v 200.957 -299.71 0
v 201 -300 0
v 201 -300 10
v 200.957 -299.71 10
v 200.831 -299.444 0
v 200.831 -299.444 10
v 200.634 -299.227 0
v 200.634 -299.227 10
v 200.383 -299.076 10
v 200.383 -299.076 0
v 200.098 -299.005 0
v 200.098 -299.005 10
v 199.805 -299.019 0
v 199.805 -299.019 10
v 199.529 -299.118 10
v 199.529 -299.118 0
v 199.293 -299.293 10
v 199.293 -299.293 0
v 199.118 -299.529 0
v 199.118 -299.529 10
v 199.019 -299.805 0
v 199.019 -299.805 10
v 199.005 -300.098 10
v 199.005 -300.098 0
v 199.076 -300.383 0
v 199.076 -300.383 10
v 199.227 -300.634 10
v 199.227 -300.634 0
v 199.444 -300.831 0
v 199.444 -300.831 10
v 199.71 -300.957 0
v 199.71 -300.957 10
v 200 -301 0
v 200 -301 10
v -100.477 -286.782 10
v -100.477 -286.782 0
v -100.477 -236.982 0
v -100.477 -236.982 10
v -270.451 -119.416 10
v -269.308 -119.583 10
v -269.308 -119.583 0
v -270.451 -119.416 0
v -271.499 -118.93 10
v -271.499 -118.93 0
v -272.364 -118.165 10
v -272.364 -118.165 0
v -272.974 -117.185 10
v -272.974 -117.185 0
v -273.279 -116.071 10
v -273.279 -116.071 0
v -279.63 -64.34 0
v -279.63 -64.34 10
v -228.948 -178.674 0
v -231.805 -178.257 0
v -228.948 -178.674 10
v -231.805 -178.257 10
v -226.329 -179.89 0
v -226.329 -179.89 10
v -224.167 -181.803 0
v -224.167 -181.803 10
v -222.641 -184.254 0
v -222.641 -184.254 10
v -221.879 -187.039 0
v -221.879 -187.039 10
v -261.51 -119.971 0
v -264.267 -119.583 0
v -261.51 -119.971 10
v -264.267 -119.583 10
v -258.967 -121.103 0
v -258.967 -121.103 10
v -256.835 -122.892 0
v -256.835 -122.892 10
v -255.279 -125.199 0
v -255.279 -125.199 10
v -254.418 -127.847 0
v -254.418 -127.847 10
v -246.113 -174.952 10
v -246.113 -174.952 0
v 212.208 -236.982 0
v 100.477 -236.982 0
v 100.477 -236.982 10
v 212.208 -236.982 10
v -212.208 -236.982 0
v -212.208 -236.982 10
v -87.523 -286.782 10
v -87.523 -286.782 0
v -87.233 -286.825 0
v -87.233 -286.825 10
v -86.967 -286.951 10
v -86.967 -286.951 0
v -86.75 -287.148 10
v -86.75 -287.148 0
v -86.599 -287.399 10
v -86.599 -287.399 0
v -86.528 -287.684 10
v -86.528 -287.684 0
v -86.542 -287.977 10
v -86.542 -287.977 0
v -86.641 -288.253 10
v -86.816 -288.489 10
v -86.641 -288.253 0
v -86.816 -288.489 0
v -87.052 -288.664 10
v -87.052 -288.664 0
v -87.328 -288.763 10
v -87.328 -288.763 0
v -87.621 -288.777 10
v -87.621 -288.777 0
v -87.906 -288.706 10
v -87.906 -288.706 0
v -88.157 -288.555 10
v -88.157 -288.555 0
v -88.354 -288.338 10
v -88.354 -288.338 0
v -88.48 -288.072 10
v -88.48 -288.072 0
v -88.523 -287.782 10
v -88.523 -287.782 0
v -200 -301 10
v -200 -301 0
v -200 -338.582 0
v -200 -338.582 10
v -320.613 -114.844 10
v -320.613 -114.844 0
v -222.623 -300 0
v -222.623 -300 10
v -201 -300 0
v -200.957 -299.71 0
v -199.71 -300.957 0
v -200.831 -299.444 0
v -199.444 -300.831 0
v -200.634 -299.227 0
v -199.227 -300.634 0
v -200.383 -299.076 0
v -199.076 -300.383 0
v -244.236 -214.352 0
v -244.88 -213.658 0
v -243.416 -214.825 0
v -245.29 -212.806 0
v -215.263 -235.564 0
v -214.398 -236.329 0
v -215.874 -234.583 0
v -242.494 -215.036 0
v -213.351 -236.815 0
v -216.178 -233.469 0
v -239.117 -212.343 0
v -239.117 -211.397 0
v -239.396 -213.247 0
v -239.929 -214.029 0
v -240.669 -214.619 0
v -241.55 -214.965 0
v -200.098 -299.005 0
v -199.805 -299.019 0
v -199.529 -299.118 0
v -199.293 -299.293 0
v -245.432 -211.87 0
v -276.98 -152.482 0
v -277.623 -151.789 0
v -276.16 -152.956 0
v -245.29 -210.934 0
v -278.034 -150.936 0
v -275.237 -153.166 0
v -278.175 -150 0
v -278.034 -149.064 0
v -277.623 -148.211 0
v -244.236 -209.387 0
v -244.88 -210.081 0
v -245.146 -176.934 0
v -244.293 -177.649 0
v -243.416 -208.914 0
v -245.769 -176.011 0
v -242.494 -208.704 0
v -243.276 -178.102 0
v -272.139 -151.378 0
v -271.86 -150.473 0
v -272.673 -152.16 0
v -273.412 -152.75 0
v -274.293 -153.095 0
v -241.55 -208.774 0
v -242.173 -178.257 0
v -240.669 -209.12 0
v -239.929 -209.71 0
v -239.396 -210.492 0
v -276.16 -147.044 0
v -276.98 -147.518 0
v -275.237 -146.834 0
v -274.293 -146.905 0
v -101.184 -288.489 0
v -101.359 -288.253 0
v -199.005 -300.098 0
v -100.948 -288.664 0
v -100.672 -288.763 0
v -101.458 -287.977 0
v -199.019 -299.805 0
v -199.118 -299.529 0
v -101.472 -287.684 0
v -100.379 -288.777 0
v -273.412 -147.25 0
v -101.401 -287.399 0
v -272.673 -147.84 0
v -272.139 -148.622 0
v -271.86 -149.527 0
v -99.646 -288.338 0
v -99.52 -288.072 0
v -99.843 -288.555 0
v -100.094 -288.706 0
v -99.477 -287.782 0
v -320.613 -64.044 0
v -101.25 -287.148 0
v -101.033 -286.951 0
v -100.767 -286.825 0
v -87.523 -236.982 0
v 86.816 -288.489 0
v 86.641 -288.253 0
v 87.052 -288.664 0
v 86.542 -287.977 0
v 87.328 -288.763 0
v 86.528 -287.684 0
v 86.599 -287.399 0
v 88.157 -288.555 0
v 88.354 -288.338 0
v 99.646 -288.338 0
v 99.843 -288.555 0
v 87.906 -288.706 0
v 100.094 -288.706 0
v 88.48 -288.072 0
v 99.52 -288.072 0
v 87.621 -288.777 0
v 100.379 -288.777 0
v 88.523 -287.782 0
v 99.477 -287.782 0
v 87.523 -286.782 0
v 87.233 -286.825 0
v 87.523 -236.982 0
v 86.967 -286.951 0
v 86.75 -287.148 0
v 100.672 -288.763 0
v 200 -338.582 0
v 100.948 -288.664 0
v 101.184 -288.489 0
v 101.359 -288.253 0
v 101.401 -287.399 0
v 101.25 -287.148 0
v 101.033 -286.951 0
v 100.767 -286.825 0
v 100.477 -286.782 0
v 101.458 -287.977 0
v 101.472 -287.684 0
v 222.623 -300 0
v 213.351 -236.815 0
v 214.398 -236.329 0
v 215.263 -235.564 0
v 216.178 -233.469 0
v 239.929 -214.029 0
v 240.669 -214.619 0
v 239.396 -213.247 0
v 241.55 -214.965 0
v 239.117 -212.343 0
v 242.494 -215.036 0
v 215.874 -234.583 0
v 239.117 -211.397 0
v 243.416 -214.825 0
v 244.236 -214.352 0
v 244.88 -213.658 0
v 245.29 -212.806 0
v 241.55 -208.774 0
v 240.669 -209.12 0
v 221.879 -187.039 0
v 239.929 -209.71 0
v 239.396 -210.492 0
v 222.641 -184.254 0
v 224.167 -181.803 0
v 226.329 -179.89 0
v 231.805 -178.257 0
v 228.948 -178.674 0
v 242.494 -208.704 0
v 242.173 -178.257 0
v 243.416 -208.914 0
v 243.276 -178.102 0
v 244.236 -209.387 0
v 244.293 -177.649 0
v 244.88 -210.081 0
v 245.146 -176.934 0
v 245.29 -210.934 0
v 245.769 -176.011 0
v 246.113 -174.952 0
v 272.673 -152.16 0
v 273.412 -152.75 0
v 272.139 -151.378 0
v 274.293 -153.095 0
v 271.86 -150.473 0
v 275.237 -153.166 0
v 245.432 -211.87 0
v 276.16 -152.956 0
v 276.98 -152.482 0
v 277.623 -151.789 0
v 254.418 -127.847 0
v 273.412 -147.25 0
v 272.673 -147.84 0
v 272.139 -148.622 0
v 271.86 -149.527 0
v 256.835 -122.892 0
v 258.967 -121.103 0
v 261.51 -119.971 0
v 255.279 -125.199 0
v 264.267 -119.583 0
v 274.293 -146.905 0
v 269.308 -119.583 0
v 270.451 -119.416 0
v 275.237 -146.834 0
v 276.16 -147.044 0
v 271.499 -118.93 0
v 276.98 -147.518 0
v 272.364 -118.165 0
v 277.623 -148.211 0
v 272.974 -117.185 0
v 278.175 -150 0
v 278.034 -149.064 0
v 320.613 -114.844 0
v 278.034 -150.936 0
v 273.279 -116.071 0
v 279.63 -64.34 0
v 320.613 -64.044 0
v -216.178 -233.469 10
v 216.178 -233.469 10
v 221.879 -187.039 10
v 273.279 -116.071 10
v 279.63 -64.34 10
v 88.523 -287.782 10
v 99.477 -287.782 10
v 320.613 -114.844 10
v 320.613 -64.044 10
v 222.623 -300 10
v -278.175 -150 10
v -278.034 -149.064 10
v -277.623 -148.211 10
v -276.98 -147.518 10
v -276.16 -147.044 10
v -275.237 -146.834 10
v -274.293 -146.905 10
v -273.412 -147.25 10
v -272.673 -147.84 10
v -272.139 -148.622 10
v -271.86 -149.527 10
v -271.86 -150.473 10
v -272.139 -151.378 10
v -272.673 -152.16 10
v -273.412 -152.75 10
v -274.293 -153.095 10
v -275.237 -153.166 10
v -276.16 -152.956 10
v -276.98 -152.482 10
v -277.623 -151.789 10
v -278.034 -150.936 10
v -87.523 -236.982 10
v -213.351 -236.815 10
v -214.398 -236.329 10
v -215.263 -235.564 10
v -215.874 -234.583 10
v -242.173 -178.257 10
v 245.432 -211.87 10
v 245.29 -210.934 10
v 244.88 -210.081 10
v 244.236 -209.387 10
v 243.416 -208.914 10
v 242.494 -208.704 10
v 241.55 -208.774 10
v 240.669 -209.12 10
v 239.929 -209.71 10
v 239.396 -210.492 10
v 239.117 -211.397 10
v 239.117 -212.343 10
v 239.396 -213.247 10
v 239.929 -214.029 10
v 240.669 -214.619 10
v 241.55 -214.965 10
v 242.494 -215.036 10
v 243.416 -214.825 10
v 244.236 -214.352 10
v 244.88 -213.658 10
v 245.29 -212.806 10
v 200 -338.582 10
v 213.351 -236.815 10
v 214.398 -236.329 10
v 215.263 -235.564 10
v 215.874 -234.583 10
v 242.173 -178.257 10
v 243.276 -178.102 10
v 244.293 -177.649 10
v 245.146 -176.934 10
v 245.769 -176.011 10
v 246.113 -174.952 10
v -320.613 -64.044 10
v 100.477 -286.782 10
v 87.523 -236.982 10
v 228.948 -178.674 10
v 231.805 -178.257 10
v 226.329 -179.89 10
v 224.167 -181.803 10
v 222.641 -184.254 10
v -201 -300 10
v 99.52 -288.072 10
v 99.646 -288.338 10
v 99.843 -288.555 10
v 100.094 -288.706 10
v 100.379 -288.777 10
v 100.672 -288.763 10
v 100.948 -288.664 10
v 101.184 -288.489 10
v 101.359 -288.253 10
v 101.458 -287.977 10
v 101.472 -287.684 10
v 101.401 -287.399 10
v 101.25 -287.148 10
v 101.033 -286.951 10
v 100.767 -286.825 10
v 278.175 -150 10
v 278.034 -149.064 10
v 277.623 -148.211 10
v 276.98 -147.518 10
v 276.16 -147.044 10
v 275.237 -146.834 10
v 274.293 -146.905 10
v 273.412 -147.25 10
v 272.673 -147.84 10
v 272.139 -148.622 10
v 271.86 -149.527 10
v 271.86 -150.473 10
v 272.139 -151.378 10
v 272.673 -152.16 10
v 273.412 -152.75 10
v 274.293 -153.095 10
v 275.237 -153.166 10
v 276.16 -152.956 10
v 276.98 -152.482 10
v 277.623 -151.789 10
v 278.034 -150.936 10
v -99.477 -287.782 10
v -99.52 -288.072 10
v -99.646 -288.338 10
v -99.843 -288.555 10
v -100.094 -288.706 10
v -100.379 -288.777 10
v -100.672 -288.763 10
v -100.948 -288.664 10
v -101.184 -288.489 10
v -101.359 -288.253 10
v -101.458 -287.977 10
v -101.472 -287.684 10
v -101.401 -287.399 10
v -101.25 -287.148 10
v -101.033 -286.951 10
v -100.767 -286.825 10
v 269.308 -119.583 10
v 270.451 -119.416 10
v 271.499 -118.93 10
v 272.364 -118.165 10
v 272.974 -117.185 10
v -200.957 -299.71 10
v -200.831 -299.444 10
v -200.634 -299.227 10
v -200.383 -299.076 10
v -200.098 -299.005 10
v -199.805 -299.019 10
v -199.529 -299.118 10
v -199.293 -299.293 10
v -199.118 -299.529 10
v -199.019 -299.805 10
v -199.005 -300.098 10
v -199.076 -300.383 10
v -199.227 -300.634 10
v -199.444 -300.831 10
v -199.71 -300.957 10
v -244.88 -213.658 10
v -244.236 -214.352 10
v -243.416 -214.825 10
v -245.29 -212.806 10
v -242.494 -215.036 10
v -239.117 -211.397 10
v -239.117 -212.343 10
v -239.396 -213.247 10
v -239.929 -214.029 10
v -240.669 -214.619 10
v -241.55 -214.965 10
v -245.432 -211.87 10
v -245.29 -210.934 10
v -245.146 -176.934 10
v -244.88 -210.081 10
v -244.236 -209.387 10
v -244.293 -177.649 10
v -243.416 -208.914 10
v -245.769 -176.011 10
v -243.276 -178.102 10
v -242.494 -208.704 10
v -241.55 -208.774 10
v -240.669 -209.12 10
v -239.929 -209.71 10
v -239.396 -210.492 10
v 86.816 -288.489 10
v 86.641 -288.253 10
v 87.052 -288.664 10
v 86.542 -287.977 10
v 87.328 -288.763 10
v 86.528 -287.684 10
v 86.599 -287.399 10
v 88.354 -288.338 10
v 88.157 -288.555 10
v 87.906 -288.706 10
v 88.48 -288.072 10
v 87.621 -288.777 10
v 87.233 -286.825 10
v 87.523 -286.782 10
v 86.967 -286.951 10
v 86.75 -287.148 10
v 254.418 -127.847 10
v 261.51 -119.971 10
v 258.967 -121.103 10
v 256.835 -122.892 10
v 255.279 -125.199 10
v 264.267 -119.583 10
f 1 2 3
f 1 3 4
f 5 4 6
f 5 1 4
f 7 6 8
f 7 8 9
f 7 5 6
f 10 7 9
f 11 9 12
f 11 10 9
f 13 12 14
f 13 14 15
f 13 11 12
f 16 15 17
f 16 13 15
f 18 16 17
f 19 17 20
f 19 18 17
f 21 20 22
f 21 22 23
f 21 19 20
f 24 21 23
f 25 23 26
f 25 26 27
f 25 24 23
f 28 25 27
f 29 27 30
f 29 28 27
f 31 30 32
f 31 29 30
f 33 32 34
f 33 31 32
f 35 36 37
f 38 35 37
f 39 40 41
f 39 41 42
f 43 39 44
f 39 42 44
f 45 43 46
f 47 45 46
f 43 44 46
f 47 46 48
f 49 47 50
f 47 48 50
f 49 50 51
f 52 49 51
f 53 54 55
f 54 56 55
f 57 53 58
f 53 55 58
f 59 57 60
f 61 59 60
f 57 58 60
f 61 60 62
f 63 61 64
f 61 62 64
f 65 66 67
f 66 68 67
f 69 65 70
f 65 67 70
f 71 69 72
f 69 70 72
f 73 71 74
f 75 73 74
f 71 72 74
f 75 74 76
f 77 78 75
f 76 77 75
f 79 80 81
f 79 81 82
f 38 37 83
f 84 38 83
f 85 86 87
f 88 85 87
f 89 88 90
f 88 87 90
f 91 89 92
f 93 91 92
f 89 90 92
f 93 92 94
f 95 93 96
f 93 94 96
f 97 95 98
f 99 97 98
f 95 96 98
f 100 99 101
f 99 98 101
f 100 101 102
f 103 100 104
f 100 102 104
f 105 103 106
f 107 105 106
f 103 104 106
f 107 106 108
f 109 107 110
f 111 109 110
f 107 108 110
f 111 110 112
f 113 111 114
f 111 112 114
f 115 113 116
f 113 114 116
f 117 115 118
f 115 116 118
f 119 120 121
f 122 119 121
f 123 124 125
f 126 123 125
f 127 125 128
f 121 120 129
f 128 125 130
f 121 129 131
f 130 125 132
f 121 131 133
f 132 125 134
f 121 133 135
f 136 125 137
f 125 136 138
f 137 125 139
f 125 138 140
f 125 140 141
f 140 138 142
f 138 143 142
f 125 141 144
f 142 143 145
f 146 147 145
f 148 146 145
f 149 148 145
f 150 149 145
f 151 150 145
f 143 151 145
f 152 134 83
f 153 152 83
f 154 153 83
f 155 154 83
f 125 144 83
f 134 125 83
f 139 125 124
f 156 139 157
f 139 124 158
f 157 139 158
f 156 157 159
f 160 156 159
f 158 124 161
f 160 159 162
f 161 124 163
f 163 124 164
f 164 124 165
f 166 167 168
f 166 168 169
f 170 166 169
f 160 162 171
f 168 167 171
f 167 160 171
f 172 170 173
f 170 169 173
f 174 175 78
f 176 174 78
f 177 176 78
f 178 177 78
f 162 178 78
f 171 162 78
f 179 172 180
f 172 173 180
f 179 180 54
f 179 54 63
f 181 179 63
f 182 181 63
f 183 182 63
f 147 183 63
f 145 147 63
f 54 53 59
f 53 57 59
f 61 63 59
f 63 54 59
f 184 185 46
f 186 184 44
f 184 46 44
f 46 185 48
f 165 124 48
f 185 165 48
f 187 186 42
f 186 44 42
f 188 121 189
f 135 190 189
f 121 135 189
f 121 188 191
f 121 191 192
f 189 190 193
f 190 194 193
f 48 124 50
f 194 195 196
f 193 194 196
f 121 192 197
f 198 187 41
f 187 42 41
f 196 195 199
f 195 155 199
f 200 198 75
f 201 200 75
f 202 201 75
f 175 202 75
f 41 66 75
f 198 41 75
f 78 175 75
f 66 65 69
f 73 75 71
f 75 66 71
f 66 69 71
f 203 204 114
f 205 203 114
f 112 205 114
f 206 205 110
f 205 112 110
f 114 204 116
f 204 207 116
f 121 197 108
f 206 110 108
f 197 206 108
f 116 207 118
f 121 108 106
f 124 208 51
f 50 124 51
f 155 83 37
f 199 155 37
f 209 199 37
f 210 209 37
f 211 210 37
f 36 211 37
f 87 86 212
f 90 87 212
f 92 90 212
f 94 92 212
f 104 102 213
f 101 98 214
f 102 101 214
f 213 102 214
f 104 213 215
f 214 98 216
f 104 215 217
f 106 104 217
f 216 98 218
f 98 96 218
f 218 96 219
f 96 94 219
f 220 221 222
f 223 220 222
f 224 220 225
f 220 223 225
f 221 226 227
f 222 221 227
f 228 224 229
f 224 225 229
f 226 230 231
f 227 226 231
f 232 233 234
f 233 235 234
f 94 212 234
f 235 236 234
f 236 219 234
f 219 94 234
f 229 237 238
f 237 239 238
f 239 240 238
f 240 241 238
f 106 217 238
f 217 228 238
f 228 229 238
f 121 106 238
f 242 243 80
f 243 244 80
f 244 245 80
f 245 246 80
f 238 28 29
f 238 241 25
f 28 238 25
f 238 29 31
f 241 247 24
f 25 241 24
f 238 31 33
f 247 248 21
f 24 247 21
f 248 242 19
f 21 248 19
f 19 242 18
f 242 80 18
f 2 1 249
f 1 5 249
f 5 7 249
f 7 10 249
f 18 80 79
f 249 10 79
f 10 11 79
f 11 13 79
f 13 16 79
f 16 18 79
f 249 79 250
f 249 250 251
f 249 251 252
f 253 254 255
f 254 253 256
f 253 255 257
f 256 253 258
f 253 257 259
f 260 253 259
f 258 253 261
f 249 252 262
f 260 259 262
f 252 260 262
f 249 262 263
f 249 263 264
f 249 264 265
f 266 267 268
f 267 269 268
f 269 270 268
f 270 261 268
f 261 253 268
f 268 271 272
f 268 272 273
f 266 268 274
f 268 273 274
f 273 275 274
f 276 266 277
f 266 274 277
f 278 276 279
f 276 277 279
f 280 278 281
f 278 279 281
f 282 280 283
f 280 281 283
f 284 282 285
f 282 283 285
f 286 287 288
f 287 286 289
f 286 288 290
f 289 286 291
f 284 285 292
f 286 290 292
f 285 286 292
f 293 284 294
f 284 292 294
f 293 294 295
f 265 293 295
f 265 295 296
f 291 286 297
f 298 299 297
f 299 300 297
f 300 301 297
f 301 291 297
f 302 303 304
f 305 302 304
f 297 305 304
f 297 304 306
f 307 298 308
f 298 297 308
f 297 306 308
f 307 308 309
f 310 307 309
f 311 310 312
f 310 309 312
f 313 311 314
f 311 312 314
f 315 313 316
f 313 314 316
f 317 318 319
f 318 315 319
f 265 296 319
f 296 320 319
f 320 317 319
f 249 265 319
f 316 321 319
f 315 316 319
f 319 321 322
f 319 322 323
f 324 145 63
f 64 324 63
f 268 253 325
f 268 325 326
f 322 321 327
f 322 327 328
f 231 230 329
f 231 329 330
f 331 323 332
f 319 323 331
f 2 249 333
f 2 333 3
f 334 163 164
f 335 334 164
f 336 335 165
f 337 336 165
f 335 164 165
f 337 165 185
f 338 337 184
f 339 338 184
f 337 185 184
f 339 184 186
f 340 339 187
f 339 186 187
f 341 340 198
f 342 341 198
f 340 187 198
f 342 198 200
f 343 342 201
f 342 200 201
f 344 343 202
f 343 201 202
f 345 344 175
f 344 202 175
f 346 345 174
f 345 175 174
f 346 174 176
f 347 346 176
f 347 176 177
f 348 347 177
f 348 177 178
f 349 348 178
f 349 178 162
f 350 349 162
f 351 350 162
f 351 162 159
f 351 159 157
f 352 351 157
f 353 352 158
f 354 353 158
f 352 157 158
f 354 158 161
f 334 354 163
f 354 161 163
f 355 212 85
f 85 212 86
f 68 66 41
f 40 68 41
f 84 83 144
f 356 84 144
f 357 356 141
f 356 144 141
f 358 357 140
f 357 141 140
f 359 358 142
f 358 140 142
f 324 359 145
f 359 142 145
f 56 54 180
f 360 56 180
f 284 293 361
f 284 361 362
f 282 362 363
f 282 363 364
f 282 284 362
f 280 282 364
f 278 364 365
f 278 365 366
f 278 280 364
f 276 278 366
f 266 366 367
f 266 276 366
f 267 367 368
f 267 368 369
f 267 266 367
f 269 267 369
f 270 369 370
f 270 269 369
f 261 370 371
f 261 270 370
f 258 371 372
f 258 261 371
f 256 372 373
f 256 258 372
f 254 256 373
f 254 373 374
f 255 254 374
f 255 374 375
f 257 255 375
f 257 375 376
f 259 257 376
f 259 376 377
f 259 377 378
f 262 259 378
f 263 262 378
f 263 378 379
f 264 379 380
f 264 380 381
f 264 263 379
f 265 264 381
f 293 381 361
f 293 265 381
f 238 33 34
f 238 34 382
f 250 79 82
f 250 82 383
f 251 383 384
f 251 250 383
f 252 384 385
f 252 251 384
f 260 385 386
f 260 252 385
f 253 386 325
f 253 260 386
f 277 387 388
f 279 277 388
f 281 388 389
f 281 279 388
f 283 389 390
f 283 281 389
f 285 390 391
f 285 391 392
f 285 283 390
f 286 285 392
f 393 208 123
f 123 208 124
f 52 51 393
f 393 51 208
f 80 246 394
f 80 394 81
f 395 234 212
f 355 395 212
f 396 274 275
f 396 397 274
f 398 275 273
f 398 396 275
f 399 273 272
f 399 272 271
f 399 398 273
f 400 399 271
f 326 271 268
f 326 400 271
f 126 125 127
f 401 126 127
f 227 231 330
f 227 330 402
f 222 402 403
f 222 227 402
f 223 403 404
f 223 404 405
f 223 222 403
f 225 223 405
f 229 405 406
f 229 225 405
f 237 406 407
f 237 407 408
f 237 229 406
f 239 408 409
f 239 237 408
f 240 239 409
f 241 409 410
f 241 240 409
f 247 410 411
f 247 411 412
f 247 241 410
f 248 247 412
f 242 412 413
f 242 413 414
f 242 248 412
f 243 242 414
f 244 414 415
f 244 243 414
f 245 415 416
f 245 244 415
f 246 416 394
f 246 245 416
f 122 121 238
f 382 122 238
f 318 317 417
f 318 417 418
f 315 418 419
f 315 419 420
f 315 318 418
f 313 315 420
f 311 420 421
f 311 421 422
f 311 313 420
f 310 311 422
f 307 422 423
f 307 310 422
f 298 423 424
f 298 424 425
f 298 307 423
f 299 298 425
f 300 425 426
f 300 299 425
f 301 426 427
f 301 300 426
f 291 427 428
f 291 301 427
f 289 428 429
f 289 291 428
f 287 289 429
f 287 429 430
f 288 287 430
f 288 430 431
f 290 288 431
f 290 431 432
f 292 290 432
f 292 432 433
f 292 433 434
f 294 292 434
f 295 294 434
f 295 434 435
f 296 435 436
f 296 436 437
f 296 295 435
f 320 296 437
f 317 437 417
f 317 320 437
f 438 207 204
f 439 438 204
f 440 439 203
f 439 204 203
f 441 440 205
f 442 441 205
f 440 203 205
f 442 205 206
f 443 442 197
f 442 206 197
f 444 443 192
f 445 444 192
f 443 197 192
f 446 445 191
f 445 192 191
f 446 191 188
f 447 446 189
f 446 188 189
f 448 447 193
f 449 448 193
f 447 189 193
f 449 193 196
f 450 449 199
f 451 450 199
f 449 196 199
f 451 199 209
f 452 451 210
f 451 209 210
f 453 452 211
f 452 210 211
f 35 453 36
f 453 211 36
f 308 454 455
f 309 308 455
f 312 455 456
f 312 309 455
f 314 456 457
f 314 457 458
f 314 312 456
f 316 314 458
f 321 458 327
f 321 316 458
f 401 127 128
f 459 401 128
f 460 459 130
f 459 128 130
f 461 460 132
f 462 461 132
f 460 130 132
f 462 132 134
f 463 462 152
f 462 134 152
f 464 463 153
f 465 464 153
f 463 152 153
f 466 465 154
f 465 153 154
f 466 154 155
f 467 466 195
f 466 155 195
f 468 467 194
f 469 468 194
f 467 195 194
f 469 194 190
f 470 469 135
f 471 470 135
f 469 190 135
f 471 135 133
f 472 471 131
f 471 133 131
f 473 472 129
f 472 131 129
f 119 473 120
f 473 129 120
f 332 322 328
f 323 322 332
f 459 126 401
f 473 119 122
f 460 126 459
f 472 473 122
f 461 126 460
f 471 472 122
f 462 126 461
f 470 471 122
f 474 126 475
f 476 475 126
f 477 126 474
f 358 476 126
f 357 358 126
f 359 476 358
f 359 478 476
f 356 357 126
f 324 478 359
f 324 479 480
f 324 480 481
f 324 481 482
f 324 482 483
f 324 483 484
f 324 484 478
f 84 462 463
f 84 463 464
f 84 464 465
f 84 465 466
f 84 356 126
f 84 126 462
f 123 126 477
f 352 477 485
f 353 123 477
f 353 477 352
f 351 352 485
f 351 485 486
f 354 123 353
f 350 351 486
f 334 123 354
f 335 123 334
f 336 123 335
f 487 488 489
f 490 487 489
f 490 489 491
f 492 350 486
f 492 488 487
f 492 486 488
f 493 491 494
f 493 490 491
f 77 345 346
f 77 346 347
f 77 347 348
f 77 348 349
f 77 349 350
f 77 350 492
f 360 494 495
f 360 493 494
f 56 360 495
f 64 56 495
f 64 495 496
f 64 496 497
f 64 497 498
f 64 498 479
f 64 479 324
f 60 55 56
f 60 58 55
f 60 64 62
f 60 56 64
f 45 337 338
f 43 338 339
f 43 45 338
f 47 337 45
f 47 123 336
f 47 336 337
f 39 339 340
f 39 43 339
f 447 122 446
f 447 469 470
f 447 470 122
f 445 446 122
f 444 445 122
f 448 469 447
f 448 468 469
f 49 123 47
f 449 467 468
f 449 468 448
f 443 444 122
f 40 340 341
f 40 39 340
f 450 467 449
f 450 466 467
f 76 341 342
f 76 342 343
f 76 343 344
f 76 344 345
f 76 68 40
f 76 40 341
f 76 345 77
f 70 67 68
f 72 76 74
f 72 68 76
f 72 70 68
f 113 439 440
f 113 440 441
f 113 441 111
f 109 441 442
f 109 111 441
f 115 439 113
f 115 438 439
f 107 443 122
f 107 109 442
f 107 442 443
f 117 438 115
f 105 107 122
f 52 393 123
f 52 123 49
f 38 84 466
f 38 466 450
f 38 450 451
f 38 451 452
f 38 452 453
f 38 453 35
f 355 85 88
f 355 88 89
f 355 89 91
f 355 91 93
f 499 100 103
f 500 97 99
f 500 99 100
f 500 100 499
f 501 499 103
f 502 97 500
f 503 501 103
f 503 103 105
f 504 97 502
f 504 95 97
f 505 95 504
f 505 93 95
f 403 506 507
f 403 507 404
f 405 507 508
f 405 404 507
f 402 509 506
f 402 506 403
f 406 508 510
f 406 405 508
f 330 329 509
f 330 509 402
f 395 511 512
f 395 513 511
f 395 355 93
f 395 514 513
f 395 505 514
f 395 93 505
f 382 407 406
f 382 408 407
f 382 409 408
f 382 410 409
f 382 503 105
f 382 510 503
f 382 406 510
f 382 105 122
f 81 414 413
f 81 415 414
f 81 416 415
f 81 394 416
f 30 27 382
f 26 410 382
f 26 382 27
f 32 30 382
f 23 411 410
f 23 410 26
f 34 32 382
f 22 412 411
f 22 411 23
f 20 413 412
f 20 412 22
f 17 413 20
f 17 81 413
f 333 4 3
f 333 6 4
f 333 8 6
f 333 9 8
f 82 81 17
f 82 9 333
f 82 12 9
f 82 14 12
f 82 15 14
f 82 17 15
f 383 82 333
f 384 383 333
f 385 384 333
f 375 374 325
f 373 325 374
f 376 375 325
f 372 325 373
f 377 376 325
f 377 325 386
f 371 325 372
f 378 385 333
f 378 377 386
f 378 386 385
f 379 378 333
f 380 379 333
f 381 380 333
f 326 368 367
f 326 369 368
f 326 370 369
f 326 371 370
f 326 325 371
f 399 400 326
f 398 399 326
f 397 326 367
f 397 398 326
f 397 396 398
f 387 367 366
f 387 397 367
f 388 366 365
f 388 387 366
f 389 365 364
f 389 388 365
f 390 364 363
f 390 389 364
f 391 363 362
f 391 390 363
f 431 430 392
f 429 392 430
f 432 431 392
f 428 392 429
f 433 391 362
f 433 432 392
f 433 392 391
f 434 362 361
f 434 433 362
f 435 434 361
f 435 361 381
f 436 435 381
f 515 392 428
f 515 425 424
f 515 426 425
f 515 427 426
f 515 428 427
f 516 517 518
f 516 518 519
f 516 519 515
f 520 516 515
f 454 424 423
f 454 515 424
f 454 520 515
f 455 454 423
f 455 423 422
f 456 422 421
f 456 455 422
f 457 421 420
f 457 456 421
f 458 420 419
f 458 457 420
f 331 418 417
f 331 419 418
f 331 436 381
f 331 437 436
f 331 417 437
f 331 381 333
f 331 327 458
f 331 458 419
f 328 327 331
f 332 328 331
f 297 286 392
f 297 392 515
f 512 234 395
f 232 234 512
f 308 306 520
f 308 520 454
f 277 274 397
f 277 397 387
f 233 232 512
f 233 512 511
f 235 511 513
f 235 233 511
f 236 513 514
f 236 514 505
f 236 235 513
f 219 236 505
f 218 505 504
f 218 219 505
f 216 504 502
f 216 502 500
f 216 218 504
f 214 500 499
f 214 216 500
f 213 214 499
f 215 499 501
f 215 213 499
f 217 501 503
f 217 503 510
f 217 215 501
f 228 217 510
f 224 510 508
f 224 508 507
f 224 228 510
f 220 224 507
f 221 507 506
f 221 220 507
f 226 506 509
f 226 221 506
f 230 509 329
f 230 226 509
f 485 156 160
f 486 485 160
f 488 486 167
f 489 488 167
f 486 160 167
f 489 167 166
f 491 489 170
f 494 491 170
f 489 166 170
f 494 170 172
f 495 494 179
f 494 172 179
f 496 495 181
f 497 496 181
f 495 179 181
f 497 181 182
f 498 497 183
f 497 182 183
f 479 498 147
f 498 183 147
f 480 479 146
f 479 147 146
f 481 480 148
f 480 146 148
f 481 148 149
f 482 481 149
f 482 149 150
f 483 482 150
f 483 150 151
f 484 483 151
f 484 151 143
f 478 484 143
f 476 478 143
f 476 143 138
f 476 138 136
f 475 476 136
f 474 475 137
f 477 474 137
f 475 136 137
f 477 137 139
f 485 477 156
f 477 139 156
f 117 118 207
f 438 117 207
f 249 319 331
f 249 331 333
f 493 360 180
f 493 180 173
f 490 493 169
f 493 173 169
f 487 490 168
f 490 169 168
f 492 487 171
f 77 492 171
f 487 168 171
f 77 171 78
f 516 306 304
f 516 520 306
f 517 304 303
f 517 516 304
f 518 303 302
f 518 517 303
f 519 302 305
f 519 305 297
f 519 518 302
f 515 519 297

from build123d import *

# Parameters (mm, degrees)
SKETCH2_R            = 3.175
BOSS_EXTRUDE1_DEPTH  = 10
FILLET1_R            = 10
FILLET1_OF_MIRROR1_R = 10


with BuildPart() as part:
    # Sketch2 → Boss-Extrude1 (new body)
    with BuildSketch(Plane.XY):
        with BuildLine():
            Line((222.622994392, -300), (320.613470585, -114.844314923))
            Line((320.613470585, -114.844314923), (320.613470585, -64.044314923))
            Line((320.613470585, -64.044314923), (279.630331697, -64.339801211))
            Line((279.630331697, -64.339801211), (273.278578782, -116.070677374))
            ThreePointArc((273.278578782, -116.070677374), (271.958874368, -118.579022883), (269.308394175, -119.5832))
            Line((269.308394175, -119.5832), (255.875555496, -119.5832))
            Line((255.875555496, -119.5832), (246.112578717, -174.951792711))
            ThreePointArc((246.112578717, -174.951792711), (244.744498144, -177.321377772), (242.173347705, -178.2572))
            Line((242.173347705, -178.2572), (222.957537911, -178.2572))
            Line((222.957537911, -178.2572), (216.178322678, -233.469477374))
            ThreePointArc((216.178322678, -233.469477374), (214.858618264, -235.977822883), (212.208138071, -236.982))
            Line((212.208138071, -236.982), (100.477, -236.982))
            Line((100.477, -236.982), (100.477, -286.782))
            ThreePointArc((100.477, -286.782), (101.184106781, -288.489106781), (99.477, -287.782))
            Line((99.477, -287.782), (88.523, -287.782))
            ThreePointArc((88.523, -287.782), (86.815893219, -288.489106781), (87.523, -286.782))
            Line((87.523, -286.782), (87.523, -236.982))
            Line((87.523, -236.982), (0, -236.982))
            Line((0, -236.982), (0, -338.582))
            Line((0, -338.582), (200, -338.582))
            Line((200, -338.582), (200, -301))
            ThreePointArc((200, -301), (199.292893219, -299.292893219), (201, -300))
            Line((201, -300), (222.622994392, -300))
        make_face()
        with Locations((242.256504613, -211.869730158)):
            Circle(SKETCH2_R, mode=Mode.SUBTRACT)
        with Locations((275, -150)):
            Circle(SKETCH2_R, mode=Mode.SUBTRACT)
    boss_extrude1 = extrude(amount=BOSS_EXTRUDE1_DEPTH)

    # Fillet1
    fillet1_edges = [part.edges().sort_by_distance(p)[0] for p in [
        (222.957537911, -178.2572, 5),
        (255.875555496, -119.5832, 5),
    ]]
    fillet(fillet1_edges, radius=FILLET1_R)

    # Mirror1: Boss-Extrude1 across plane
    add(boss_extrude1.mirror(Plane(origin=(0, 0, 10), x_dir=(0, 0, 1), z_dir=(1, 0, 0))))

    # Fillet1 of Mirror1
    fillet1_of_mirror1_edges = [part.edges().sort_by_distance(p)[0] for p in [
        (-222.957537911, -178.2572, 5),
        (-255.875555496, -119.5832, 5),
    ]]
    fillet(fillet1_of_mirror1_edges, radius=FILLET1_OF_MIRROR1_R)


solid = part.part
